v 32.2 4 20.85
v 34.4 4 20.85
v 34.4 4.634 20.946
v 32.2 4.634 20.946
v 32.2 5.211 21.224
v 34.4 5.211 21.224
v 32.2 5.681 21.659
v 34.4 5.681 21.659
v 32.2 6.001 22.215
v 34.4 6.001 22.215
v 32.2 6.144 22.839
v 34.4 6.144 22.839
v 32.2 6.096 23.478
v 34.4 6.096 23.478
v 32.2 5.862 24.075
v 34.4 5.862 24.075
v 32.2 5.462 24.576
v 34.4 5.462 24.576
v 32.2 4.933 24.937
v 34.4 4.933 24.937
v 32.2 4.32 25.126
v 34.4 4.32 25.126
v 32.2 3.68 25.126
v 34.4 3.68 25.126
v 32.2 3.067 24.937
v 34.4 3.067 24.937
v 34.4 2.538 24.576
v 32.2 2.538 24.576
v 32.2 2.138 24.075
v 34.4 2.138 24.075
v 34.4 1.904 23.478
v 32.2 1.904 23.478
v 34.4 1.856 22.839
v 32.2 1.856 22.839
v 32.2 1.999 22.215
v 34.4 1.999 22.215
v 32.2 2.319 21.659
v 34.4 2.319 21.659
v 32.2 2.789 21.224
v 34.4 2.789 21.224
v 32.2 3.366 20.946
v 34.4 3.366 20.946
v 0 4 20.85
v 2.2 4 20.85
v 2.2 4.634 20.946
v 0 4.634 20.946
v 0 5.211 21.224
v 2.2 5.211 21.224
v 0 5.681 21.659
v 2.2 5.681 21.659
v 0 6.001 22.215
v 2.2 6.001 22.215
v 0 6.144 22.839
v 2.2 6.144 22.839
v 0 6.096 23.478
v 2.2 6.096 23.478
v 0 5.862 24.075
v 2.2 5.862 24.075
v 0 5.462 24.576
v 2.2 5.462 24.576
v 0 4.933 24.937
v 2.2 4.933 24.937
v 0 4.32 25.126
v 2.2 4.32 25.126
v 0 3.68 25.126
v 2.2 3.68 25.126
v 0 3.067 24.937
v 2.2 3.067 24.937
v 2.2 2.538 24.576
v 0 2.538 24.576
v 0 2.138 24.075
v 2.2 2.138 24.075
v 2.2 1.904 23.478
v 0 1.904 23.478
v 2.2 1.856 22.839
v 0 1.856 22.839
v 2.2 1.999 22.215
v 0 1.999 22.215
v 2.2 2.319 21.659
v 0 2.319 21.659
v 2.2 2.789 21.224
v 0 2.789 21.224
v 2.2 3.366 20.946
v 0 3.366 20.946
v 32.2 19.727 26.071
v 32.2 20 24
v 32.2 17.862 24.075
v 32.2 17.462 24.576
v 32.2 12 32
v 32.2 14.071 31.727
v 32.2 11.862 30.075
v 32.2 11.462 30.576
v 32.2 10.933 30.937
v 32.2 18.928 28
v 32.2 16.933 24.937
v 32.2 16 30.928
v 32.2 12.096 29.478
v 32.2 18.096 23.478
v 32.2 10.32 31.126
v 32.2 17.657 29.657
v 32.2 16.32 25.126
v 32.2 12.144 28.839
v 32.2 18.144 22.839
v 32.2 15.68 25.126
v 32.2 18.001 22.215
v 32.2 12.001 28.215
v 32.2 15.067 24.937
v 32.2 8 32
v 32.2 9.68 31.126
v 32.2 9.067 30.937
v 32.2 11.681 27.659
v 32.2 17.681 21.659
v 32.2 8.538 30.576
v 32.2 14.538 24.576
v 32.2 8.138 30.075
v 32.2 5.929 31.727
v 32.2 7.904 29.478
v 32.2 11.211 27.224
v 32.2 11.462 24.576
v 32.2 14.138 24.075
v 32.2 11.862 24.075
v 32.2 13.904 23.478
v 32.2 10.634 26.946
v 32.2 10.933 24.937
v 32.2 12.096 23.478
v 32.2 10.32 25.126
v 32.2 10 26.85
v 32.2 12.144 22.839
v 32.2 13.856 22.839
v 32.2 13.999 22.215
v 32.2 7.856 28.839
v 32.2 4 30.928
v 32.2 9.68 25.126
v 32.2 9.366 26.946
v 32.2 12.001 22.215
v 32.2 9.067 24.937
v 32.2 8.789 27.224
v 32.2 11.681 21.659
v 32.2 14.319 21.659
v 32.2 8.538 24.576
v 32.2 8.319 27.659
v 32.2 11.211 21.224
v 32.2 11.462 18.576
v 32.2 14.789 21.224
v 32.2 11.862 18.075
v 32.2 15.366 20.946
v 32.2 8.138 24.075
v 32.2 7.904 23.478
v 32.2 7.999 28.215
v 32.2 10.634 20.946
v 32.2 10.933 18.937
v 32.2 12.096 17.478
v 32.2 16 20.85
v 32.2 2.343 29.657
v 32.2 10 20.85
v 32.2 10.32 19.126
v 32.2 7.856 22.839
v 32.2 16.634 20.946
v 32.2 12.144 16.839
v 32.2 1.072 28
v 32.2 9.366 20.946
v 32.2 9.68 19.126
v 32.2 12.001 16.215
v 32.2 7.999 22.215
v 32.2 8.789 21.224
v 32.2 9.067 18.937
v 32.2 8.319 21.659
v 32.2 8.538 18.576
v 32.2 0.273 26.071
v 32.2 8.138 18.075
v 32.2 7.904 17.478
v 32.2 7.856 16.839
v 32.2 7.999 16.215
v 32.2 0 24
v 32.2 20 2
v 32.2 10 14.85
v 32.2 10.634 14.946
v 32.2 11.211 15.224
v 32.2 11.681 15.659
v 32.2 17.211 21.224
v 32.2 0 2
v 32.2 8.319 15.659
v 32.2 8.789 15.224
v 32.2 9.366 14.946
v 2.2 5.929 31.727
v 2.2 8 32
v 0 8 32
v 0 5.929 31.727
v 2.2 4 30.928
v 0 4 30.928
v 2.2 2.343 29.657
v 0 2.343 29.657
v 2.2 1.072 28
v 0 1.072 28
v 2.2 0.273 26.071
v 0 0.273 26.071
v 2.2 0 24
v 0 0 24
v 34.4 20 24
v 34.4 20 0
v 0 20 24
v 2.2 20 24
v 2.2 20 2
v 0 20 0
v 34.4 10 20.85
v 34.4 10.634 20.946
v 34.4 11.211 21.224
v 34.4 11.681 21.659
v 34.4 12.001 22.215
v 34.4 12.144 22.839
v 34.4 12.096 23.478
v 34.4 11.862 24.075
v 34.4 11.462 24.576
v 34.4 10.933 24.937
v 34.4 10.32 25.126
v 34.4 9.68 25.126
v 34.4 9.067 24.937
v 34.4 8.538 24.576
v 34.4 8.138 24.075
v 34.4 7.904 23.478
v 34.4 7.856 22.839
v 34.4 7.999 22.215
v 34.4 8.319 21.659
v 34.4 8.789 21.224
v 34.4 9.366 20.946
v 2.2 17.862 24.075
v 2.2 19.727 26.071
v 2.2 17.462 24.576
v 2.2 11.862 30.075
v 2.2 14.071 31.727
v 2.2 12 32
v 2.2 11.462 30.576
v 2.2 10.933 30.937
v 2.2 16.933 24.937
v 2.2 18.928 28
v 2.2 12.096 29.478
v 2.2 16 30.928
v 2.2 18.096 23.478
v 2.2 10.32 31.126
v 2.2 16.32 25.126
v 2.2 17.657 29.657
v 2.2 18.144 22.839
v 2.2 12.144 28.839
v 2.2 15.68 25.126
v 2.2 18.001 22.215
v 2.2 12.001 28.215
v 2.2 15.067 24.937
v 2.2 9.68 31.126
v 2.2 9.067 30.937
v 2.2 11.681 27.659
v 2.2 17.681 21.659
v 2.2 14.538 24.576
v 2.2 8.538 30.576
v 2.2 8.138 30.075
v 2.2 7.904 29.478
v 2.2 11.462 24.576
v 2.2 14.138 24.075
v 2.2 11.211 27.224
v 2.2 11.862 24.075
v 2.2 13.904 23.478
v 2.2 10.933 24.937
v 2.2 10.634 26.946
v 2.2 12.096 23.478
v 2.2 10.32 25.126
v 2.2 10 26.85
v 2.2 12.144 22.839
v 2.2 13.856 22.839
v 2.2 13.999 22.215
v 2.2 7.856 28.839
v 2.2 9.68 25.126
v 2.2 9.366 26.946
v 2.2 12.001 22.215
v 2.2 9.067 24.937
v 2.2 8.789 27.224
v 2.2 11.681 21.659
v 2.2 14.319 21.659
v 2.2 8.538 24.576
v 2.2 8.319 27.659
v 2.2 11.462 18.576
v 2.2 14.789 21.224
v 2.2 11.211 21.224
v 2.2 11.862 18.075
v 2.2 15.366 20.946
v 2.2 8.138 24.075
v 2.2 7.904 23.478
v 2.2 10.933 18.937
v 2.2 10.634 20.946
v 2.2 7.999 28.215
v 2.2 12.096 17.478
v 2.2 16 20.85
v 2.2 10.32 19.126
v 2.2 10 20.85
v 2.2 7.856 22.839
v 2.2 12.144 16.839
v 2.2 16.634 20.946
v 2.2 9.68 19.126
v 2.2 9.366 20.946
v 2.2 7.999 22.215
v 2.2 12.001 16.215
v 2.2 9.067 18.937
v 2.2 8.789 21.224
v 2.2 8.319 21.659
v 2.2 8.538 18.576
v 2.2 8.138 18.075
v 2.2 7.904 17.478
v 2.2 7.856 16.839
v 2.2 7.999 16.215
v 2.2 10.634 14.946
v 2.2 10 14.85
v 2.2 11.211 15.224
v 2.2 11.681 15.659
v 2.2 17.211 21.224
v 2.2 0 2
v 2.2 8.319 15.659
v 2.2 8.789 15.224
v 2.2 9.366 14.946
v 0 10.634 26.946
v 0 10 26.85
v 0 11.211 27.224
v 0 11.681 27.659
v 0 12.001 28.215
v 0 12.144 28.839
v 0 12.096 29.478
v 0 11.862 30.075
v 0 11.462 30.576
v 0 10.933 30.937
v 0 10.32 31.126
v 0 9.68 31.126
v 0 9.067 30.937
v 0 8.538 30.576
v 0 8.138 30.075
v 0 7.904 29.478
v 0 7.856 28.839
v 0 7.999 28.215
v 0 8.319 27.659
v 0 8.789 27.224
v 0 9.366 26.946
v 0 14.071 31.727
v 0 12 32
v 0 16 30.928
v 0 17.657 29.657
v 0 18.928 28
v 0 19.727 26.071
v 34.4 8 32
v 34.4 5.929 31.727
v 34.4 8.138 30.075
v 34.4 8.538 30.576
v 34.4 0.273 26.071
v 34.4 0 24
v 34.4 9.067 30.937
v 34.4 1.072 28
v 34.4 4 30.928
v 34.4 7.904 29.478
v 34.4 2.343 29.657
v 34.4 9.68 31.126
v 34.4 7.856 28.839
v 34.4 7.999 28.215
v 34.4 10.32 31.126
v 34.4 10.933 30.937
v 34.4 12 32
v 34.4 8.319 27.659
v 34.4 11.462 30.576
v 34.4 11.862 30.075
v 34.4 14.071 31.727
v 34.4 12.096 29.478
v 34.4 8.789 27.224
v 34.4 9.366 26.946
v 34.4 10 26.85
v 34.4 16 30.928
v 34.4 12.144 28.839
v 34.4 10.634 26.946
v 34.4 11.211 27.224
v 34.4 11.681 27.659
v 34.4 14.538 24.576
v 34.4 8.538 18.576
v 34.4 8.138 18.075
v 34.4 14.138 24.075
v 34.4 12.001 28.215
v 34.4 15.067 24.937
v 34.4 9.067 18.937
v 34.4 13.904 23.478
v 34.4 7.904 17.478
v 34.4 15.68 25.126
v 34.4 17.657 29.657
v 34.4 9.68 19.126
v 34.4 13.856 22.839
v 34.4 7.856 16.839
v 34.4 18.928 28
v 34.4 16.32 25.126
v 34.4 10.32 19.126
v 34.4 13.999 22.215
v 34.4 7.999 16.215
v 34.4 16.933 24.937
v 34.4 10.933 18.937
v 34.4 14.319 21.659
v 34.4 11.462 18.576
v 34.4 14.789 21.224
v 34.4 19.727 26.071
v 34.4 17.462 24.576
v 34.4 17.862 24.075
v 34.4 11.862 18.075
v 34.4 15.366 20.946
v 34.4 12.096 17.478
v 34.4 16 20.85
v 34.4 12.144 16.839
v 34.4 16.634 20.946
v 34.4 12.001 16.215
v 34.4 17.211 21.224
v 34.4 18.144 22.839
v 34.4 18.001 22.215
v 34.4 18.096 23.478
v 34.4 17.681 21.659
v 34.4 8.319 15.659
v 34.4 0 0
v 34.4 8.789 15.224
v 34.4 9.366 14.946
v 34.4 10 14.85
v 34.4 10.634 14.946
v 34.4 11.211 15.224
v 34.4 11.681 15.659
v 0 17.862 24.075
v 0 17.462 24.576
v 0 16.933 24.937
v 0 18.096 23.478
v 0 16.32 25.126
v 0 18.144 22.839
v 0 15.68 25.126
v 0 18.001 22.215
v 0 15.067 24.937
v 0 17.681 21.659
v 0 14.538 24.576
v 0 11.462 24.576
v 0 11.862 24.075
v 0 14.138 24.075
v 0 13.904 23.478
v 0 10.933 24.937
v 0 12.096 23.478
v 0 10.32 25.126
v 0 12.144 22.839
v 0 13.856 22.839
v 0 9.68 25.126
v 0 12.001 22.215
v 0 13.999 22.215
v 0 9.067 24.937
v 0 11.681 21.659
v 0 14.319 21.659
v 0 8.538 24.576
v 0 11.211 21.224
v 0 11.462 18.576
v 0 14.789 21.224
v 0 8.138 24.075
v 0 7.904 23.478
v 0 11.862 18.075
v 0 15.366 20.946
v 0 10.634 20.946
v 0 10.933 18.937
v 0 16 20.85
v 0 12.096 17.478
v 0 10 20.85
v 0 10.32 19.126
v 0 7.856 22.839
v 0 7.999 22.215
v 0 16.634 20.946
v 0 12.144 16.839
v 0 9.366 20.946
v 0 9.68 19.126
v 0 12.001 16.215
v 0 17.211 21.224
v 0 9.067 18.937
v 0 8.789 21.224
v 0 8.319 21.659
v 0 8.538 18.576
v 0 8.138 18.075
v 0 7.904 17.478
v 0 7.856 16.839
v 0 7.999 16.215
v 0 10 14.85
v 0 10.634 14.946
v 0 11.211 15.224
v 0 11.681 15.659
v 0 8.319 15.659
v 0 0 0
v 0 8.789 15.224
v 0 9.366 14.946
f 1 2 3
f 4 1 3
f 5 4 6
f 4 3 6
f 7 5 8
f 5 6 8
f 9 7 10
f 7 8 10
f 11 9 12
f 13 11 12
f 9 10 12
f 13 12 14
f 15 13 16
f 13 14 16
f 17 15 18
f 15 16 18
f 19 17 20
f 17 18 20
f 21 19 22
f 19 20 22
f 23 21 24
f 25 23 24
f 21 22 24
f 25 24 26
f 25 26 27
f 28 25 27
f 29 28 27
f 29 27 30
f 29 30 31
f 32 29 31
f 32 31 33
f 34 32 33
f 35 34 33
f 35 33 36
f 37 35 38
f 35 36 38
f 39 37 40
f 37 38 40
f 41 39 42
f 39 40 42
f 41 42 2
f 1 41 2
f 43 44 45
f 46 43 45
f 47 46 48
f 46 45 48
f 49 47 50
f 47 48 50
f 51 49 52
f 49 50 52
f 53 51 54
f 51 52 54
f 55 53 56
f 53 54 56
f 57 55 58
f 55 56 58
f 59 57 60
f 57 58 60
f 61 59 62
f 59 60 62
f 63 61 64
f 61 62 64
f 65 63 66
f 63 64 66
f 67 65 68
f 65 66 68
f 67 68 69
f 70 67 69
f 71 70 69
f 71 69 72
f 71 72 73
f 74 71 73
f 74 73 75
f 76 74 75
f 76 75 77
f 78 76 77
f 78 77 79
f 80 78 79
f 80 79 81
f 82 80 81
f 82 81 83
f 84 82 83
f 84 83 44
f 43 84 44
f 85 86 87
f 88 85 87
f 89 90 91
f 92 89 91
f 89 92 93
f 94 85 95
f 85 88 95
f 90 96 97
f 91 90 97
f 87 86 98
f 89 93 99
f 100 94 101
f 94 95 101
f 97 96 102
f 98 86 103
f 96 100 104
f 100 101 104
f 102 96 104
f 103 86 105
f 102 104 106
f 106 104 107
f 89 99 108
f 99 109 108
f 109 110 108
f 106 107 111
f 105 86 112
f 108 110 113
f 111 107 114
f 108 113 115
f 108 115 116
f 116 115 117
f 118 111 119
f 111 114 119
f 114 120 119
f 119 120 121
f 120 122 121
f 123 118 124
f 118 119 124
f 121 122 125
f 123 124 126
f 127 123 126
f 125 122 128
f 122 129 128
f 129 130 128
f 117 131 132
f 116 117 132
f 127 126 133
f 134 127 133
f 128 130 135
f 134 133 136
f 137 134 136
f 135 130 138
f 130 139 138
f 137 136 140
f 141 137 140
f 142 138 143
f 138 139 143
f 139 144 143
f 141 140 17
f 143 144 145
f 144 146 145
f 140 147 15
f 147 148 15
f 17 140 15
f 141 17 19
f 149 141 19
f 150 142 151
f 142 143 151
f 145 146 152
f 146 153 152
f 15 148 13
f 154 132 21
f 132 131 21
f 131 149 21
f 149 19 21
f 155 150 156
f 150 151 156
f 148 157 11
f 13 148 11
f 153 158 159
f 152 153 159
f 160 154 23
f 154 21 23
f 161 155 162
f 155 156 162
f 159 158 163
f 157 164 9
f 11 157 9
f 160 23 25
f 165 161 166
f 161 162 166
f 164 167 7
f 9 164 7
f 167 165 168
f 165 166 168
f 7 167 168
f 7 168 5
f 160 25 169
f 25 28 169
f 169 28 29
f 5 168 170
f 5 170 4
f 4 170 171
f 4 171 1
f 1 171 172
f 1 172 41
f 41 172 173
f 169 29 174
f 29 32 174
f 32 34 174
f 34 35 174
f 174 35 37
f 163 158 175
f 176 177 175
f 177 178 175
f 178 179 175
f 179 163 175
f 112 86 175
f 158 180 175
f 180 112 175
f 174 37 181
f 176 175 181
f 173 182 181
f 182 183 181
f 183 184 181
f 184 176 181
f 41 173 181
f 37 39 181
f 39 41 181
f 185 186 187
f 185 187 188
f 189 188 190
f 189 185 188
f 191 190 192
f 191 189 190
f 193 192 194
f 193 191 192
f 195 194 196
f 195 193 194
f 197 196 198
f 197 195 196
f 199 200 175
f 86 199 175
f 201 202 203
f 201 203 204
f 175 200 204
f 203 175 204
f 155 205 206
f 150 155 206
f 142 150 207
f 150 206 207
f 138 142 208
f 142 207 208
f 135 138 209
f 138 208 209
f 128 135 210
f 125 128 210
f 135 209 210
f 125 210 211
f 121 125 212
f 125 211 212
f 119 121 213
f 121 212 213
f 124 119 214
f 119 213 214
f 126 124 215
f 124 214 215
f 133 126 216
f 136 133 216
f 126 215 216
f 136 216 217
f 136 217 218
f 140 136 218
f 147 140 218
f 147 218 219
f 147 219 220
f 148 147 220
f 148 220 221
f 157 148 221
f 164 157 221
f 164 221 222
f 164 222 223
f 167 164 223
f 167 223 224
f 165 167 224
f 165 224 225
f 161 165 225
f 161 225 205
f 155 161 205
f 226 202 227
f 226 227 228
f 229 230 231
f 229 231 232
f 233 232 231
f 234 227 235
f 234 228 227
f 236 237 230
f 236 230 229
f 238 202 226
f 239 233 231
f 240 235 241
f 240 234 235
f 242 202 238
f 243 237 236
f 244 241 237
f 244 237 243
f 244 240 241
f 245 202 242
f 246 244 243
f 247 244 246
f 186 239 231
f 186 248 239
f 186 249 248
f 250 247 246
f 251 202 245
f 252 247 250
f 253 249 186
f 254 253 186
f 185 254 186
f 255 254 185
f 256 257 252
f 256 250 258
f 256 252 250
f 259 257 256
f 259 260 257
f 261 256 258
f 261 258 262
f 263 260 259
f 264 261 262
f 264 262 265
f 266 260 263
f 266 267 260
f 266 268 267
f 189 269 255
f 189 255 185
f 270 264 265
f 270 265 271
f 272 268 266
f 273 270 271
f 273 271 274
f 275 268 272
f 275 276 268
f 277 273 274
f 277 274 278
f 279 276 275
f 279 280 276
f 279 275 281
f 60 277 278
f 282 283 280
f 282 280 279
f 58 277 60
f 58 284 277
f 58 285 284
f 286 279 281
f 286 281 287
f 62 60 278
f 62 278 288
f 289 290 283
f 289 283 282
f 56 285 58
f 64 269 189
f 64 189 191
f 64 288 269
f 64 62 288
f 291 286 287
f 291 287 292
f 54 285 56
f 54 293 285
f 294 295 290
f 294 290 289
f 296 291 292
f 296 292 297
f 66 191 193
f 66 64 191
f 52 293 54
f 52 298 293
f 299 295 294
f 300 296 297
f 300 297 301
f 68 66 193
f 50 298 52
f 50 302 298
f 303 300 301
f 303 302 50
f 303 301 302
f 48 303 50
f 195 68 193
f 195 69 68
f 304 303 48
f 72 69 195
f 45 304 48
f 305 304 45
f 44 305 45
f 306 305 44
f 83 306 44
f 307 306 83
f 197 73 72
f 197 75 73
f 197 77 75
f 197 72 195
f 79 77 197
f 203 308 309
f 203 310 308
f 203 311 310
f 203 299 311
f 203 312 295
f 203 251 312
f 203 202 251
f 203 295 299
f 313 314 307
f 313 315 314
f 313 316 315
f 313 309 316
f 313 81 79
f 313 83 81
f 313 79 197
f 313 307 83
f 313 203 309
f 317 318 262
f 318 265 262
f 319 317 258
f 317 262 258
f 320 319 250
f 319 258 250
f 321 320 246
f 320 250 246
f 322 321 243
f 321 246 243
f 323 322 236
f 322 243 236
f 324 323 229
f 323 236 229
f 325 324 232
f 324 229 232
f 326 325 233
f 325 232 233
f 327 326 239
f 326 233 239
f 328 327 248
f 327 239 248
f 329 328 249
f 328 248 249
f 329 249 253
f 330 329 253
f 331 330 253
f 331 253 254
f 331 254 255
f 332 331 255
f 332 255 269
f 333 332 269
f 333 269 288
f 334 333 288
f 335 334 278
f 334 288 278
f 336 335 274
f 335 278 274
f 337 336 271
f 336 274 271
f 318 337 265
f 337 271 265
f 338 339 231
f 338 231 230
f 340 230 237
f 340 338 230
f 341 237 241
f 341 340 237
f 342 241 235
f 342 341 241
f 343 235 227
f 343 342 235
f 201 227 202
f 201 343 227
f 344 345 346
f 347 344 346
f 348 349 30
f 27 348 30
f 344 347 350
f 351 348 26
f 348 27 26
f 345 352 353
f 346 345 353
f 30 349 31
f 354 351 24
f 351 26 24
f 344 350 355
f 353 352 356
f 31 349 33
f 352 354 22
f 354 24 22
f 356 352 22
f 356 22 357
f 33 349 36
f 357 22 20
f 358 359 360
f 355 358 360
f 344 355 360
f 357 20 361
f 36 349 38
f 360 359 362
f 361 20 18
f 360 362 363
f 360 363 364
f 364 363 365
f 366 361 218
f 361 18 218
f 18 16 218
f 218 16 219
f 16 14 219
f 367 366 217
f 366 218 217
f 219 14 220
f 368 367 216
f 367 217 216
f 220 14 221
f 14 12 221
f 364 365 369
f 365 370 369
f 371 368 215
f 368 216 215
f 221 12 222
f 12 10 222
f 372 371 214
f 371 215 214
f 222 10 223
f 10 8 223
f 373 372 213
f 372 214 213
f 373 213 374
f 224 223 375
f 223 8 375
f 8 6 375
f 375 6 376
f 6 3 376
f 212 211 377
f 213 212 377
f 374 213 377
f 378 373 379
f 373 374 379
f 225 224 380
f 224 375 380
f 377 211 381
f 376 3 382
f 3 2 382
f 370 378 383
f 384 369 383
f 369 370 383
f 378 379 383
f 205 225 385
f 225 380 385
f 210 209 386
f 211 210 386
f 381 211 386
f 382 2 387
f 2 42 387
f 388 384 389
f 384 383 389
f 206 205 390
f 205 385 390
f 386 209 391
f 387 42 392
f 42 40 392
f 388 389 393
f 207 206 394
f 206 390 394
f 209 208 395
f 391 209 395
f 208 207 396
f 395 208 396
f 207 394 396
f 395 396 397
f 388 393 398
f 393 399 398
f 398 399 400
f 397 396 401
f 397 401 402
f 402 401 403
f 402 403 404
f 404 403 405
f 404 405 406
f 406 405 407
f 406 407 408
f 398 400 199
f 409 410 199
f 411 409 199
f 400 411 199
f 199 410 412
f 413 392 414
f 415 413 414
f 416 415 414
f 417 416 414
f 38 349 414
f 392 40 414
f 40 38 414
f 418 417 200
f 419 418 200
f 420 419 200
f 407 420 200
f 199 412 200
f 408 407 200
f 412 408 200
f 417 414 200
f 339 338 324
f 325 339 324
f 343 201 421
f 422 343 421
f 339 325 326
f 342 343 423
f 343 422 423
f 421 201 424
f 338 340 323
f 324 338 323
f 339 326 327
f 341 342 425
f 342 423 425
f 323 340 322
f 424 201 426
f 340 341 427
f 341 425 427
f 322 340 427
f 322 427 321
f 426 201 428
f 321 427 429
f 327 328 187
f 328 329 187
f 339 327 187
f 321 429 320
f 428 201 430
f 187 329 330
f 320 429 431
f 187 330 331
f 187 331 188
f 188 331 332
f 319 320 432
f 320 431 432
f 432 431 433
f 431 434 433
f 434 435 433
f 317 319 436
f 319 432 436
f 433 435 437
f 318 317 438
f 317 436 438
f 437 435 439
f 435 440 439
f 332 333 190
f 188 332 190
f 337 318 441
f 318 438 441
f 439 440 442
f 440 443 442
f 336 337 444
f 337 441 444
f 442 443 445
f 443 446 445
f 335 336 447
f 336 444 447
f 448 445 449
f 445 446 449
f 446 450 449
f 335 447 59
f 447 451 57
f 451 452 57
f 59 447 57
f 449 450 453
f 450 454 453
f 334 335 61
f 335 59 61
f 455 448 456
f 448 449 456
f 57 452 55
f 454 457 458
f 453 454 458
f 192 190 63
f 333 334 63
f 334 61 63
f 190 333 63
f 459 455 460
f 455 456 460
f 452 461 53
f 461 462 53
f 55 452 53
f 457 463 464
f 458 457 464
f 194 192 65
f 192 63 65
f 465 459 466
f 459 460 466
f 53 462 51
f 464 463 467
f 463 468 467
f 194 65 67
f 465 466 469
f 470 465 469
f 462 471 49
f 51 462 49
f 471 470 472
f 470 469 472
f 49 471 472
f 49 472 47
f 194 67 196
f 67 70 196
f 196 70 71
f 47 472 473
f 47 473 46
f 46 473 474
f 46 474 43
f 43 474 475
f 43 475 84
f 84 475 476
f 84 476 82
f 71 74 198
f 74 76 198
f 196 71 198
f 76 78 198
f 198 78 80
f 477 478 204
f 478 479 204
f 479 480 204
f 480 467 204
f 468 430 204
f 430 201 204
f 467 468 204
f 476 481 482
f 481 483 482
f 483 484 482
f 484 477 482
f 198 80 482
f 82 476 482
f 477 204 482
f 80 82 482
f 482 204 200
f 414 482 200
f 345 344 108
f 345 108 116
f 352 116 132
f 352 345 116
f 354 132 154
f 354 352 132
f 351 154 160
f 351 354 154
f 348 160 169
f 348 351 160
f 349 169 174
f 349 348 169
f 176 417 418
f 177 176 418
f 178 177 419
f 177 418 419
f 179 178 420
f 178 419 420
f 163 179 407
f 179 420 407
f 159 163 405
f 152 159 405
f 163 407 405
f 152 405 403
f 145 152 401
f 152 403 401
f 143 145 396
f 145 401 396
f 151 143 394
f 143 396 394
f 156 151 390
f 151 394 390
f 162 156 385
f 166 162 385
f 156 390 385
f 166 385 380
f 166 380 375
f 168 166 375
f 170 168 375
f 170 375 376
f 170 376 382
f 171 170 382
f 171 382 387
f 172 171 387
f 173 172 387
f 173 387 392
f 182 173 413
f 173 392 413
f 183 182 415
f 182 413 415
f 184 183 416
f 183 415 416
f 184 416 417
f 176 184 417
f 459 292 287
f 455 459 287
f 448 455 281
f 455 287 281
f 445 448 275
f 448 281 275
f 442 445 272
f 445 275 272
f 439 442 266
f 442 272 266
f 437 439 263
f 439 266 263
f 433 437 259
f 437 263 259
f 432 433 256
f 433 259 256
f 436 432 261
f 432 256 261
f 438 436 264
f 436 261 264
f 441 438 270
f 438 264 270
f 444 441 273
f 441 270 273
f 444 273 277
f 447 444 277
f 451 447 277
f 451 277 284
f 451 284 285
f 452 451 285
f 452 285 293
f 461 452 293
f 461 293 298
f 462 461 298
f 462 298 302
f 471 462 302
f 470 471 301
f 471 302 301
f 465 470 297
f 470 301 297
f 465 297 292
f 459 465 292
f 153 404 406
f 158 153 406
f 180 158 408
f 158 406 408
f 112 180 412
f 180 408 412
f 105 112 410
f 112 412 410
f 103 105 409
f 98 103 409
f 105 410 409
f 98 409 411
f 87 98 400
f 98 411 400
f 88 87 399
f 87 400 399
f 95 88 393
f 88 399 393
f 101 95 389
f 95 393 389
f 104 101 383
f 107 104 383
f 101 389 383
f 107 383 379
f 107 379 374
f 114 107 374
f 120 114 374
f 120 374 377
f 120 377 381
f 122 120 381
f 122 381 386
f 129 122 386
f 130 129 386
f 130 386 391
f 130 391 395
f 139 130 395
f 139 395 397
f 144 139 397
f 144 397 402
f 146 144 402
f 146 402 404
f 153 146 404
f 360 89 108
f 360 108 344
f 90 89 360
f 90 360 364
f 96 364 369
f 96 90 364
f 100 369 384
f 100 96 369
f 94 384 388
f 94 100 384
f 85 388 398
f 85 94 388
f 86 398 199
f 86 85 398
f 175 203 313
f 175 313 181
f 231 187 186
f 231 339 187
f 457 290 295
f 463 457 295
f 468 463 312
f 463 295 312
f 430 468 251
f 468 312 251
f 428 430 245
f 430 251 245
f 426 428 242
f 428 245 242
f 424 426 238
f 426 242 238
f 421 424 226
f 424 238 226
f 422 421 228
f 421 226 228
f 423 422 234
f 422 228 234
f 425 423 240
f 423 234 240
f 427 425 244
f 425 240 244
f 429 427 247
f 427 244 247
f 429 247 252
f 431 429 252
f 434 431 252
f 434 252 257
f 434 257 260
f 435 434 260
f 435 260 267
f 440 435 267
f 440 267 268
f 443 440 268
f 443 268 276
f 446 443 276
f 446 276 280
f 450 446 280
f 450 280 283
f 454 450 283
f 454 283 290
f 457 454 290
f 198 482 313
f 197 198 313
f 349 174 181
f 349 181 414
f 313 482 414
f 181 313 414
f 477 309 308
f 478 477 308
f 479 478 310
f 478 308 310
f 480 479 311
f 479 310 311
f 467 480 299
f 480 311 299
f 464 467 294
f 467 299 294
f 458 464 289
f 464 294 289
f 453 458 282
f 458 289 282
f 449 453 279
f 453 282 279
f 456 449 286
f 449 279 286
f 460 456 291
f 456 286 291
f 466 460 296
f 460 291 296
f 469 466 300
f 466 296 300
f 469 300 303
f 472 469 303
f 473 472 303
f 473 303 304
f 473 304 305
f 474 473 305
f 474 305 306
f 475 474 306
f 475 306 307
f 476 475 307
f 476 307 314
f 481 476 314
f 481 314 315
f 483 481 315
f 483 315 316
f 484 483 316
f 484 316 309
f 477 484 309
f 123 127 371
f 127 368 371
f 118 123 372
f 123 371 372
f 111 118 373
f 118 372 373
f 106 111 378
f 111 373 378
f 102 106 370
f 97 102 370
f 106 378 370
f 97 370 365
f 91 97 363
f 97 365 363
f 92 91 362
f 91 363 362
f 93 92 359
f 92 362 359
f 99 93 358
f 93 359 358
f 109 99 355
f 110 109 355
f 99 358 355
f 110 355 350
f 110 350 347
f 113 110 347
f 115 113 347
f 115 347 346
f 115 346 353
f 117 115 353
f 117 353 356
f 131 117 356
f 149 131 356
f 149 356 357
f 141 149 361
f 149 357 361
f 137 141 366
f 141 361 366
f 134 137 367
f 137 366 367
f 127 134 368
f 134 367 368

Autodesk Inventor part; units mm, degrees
ref_plane "YZ Plane" through (0, 0, 0) normal (1, 0, 0) x (0, 1, 0)
ref_plane "XZ Plane" through (0, 0, 0) normal (0, 1, 0) x (-1, 0, 0)
ref_plane "XY Plane" through (0, 0, 0) normal (0, 0, 1) x (1, 0, 0)
sketch "Esquisse1" plane through (0, 0, 0) normal (0, 0, 1) x (1, 0, 0)
  line L0 (0, 0) -> (34.4, 0)
  line L1 (34.4, 0) -> (34.4, 20)
  line L2 (34.4, 20) -> (0, 20)
  line L3 (0, 20) -> (0, 0)
  dimension "d0" = 34.4
  dimension "d1" = 20
extrude "Extrusion1" add sketch "Esquisse1" along normal blind 2
sketch "Esquisse2" plane through (0, 0, 2) normal (0, 0, 1) x (1, 0, 0)
  line L0 (0, 0) -> (34.4, 0) projected
  line L1 (34.4, 20) -> (0, 20) projected
  line L2 (0, 20) -> (0, 0) projected
  line L3 (0, 20) -> (2.2, 20)
  line L4 (2.2, 20) -> (2.2, 0)
  line L5 (2.2, 0) -> (0, 0)
  line L6 (0, 0) -> (0, 20)
  line L7 (17.2, 20) -> (17.2, 0) construction
  line L8 (34.4, 20) -> (32.2, 20)
  line L9 (32.2, 20) -> (32.2, 0)
  line L10 (32.2, 0) -> (34.4, 0)
  line L11 (34.4, 0) -> (34.4, 20)
  dimension "d4" = 2.2
extrude "Extrusion2" add sketch "Esquisse2" along normal blind 30 contours L2 L1 L4 L0 | L9 L1 L11 L0
sketch "Esquisse3" plane through (34.4, 0, 0) normal (1, 0, 0) x (0, 0, -1)
  line L0 (0, 0) -> (0, 20) construction
  line L1 (-32, 0) -> (-32, 20) construction
  line L2 (-32, 10) -> (0, 10) construction
  circle A0 centre (-23, 10) radius 2.15
  line L3 (-23, 10) -> (-23, 15.2246) construction
  circle A1 centre (-17, 10) radius 2.15
  circle A2 centre (-29, 10) radius 2.15
  circle A3 centre (-23, 10) radius 2.15
  circle A4 centre (-23, 16) radius 2.15
  circle A5 centre (-23, 4) radius 2.15
  circle A6 centre (-23, 10) radius 2.15
  dimension "d7" = 9
  dimension "d8" = 4.3
  dimension "d11" = 6
  dimension "d14" = 6
  dimension "d19" = 6
  dimension "d22" = 6
extrude "Extrusion3" cut sketch "Esquisse3" against normal through all
fillet "Congé1" radius 8 4 edges at (33.3, 20, 32) (1.1, 20, 32) (1.1, 0, 32) (33.3, 0, 32)
properties part number "U"
